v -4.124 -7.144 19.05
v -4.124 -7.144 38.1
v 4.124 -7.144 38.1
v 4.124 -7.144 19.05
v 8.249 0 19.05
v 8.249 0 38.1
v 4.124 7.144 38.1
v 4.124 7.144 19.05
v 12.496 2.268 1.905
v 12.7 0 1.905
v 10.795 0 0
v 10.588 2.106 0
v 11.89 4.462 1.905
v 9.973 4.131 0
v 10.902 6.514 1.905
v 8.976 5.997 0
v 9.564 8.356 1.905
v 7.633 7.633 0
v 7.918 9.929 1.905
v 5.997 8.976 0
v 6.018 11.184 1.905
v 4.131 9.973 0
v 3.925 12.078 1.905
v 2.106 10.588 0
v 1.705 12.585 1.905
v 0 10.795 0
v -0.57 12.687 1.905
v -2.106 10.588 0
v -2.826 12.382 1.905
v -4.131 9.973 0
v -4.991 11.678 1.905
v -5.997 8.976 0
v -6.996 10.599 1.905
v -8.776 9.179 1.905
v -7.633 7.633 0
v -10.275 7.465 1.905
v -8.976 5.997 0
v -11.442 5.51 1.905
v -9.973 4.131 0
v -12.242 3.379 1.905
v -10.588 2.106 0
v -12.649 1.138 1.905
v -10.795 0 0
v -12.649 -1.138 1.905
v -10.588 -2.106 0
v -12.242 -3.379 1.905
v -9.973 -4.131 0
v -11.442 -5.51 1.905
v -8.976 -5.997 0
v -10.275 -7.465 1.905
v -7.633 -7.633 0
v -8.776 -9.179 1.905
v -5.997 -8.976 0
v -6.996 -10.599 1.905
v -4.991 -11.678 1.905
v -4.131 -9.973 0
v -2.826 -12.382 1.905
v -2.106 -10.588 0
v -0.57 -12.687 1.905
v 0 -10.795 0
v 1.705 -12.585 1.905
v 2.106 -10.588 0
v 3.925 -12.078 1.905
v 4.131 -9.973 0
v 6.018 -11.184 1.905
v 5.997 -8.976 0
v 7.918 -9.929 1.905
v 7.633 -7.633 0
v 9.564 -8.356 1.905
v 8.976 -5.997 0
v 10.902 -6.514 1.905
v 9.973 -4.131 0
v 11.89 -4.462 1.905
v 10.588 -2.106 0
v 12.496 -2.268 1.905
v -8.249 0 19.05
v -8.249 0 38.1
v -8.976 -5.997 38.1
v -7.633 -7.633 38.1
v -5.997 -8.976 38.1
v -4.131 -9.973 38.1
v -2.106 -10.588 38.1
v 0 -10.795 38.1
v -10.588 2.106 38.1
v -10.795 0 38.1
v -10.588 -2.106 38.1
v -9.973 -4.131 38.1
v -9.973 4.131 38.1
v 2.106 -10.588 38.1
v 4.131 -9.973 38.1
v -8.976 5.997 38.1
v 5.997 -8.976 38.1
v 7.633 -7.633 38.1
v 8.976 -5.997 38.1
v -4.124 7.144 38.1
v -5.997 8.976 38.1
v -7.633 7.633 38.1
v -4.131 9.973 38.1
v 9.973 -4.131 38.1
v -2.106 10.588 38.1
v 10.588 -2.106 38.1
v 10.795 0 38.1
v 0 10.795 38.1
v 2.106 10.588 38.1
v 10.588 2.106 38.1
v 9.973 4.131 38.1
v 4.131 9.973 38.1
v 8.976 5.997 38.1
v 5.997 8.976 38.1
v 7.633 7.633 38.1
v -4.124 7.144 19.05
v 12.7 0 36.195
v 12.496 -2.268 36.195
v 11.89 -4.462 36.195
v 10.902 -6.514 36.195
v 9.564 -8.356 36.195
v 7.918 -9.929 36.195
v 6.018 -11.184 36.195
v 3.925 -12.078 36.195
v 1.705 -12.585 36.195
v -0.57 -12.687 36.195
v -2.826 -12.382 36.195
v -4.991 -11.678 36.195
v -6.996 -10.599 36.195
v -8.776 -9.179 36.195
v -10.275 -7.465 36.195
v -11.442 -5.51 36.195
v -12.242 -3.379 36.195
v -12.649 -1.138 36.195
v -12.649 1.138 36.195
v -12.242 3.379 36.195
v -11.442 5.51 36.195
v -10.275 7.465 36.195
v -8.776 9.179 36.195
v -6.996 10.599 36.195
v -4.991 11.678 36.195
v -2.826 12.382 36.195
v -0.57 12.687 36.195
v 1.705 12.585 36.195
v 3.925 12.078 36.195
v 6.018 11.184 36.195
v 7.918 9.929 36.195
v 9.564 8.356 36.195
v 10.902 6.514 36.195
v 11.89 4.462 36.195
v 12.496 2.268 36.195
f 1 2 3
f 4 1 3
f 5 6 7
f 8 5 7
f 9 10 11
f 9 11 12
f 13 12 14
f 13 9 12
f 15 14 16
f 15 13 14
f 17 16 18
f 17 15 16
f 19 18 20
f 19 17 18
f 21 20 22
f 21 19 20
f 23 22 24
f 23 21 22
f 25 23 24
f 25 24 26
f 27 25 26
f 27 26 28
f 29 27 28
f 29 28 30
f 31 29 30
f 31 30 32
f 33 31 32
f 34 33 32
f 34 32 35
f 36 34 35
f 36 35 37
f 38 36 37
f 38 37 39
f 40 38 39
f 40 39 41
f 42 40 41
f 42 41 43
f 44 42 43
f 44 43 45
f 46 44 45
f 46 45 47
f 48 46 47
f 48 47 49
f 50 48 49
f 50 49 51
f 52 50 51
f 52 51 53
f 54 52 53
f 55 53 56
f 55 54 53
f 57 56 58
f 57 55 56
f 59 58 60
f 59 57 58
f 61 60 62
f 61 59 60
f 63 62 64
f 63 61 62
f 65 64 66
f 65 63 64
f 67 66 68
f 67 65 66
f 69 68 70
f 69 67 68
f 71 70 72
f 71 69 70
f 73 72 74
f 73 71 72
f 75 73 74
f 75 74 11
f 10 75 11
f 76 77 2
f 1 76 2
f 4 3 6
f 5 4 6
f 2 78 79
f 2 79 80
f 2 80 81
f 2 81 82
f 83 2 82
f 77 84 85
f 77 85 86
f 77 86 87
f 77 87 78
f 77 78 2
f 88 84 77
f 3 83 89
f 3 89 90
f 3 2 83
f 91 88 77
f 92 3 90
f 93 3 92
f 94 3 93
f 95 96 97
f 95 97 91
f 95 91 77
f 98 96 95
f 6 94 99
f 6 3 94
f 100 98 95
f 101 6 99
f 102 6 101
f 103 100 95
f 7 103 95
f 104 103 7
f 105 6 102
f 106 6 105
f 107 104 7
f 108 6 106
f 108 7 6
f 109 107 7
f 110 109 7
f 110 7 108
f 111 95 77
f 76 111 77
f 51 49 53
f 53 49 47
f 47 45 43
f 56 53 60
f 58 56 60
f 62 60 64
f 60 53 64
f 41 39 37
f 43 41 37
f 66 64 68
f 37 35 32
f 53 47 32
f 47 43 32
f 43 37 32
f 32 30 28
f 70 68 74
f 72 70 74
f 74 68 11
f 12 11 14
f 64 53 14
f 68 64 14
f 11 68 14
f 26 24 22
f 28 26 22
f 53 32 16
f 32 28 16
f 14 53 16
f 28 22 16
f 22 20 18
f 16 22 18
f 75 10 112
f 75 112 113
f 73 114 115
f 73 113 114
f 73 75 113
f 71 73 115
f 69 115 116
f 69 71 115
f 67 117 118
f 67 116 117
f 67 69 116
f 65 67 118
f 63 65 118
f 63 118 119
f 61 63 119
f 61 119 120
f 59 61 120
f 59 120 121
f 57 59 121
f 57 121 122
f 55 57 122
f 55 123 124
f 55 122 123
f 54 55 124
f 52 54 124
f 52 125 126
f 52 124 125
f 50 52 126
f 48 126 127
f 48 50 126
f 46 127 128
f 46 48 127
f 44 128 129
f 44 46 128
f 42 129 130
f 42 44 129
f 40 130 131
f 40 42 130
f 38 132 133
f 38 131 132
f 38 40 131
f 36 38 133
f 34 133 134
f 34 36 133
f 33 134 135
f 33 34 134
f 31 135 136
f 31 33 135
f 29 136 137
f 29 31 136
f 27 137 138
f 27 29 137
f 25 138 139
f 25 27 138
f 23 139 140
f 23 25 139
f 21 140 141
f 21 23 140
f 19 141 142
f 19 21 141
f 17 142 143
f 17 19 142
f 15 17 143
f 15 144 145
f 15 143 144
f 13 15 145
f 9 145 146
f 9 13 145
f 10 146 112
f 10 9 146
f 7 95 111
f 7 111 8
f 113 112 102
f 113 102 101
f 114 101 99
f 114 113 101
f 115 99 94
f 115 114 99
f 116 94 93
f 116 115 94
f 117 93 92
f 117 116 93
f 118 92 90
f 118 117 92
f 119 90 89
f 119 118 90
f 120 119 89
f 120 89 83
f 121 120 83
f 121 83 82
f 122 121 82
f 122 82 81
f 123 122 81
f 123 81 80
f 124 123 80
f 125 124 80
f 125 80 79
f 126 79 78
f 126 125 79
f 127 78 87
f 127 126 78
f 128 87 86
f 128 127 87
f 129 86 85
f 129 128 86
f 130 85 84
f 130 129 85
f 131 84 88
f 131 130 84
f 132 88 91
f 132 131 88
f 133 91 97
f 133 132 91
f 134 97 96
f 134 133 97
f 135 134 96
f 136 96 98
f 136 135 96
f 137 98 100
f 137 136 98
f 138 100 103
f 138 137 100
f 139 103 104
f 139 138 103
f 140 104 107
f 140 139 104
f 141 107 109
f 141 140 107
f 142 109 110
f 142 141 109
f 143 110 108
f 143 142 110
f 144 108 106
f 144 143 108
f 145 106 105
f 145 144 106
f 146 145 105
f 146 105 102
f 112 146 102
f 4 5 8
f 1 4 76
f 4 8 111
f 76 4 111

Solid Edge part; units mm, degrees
sketch "Sketch1" plane through (0, 0, 0) normal (0, 0, 1) x (1, 0, 0)
  circle A0 centre (0, 0) radius 12.7
  dimension "D1" = 25.4
extrude "Protrusion1" add sketch "Sketch1" along normal blind 38.1
chamfer "Chamfer1" distance 1.905 angle 45 2 edges at (-12.7, 0, 0) (-12.7, 0, 38.1)
sketch "Sketch2" plane through (0, 0, 38.1) normal (0, 0, 1) x (1, 0, 0)
  line L0 (-4.1244, 7.1438) -> (4.1244, 7.1438)
  line L1 (8.2489, 0) -> (4.1244, 7.1437)
  line L2 (4.1244, -7.1437) -> (8.2489, 0)
  line L3 (-4.1244, -7.1438) -> (4.1244, -7.1438)
  line L4 (-8.2489, 0) -> (-4.1244, -7.1437)
  line L5 (-4.1244, 7.1437) -> (-8.2489, 0)
  dimension "D1" = 14.2875
extrude "Cutout1" cut sketch "Sketch2" against normal blind 19.05
properties part number "24104263"
